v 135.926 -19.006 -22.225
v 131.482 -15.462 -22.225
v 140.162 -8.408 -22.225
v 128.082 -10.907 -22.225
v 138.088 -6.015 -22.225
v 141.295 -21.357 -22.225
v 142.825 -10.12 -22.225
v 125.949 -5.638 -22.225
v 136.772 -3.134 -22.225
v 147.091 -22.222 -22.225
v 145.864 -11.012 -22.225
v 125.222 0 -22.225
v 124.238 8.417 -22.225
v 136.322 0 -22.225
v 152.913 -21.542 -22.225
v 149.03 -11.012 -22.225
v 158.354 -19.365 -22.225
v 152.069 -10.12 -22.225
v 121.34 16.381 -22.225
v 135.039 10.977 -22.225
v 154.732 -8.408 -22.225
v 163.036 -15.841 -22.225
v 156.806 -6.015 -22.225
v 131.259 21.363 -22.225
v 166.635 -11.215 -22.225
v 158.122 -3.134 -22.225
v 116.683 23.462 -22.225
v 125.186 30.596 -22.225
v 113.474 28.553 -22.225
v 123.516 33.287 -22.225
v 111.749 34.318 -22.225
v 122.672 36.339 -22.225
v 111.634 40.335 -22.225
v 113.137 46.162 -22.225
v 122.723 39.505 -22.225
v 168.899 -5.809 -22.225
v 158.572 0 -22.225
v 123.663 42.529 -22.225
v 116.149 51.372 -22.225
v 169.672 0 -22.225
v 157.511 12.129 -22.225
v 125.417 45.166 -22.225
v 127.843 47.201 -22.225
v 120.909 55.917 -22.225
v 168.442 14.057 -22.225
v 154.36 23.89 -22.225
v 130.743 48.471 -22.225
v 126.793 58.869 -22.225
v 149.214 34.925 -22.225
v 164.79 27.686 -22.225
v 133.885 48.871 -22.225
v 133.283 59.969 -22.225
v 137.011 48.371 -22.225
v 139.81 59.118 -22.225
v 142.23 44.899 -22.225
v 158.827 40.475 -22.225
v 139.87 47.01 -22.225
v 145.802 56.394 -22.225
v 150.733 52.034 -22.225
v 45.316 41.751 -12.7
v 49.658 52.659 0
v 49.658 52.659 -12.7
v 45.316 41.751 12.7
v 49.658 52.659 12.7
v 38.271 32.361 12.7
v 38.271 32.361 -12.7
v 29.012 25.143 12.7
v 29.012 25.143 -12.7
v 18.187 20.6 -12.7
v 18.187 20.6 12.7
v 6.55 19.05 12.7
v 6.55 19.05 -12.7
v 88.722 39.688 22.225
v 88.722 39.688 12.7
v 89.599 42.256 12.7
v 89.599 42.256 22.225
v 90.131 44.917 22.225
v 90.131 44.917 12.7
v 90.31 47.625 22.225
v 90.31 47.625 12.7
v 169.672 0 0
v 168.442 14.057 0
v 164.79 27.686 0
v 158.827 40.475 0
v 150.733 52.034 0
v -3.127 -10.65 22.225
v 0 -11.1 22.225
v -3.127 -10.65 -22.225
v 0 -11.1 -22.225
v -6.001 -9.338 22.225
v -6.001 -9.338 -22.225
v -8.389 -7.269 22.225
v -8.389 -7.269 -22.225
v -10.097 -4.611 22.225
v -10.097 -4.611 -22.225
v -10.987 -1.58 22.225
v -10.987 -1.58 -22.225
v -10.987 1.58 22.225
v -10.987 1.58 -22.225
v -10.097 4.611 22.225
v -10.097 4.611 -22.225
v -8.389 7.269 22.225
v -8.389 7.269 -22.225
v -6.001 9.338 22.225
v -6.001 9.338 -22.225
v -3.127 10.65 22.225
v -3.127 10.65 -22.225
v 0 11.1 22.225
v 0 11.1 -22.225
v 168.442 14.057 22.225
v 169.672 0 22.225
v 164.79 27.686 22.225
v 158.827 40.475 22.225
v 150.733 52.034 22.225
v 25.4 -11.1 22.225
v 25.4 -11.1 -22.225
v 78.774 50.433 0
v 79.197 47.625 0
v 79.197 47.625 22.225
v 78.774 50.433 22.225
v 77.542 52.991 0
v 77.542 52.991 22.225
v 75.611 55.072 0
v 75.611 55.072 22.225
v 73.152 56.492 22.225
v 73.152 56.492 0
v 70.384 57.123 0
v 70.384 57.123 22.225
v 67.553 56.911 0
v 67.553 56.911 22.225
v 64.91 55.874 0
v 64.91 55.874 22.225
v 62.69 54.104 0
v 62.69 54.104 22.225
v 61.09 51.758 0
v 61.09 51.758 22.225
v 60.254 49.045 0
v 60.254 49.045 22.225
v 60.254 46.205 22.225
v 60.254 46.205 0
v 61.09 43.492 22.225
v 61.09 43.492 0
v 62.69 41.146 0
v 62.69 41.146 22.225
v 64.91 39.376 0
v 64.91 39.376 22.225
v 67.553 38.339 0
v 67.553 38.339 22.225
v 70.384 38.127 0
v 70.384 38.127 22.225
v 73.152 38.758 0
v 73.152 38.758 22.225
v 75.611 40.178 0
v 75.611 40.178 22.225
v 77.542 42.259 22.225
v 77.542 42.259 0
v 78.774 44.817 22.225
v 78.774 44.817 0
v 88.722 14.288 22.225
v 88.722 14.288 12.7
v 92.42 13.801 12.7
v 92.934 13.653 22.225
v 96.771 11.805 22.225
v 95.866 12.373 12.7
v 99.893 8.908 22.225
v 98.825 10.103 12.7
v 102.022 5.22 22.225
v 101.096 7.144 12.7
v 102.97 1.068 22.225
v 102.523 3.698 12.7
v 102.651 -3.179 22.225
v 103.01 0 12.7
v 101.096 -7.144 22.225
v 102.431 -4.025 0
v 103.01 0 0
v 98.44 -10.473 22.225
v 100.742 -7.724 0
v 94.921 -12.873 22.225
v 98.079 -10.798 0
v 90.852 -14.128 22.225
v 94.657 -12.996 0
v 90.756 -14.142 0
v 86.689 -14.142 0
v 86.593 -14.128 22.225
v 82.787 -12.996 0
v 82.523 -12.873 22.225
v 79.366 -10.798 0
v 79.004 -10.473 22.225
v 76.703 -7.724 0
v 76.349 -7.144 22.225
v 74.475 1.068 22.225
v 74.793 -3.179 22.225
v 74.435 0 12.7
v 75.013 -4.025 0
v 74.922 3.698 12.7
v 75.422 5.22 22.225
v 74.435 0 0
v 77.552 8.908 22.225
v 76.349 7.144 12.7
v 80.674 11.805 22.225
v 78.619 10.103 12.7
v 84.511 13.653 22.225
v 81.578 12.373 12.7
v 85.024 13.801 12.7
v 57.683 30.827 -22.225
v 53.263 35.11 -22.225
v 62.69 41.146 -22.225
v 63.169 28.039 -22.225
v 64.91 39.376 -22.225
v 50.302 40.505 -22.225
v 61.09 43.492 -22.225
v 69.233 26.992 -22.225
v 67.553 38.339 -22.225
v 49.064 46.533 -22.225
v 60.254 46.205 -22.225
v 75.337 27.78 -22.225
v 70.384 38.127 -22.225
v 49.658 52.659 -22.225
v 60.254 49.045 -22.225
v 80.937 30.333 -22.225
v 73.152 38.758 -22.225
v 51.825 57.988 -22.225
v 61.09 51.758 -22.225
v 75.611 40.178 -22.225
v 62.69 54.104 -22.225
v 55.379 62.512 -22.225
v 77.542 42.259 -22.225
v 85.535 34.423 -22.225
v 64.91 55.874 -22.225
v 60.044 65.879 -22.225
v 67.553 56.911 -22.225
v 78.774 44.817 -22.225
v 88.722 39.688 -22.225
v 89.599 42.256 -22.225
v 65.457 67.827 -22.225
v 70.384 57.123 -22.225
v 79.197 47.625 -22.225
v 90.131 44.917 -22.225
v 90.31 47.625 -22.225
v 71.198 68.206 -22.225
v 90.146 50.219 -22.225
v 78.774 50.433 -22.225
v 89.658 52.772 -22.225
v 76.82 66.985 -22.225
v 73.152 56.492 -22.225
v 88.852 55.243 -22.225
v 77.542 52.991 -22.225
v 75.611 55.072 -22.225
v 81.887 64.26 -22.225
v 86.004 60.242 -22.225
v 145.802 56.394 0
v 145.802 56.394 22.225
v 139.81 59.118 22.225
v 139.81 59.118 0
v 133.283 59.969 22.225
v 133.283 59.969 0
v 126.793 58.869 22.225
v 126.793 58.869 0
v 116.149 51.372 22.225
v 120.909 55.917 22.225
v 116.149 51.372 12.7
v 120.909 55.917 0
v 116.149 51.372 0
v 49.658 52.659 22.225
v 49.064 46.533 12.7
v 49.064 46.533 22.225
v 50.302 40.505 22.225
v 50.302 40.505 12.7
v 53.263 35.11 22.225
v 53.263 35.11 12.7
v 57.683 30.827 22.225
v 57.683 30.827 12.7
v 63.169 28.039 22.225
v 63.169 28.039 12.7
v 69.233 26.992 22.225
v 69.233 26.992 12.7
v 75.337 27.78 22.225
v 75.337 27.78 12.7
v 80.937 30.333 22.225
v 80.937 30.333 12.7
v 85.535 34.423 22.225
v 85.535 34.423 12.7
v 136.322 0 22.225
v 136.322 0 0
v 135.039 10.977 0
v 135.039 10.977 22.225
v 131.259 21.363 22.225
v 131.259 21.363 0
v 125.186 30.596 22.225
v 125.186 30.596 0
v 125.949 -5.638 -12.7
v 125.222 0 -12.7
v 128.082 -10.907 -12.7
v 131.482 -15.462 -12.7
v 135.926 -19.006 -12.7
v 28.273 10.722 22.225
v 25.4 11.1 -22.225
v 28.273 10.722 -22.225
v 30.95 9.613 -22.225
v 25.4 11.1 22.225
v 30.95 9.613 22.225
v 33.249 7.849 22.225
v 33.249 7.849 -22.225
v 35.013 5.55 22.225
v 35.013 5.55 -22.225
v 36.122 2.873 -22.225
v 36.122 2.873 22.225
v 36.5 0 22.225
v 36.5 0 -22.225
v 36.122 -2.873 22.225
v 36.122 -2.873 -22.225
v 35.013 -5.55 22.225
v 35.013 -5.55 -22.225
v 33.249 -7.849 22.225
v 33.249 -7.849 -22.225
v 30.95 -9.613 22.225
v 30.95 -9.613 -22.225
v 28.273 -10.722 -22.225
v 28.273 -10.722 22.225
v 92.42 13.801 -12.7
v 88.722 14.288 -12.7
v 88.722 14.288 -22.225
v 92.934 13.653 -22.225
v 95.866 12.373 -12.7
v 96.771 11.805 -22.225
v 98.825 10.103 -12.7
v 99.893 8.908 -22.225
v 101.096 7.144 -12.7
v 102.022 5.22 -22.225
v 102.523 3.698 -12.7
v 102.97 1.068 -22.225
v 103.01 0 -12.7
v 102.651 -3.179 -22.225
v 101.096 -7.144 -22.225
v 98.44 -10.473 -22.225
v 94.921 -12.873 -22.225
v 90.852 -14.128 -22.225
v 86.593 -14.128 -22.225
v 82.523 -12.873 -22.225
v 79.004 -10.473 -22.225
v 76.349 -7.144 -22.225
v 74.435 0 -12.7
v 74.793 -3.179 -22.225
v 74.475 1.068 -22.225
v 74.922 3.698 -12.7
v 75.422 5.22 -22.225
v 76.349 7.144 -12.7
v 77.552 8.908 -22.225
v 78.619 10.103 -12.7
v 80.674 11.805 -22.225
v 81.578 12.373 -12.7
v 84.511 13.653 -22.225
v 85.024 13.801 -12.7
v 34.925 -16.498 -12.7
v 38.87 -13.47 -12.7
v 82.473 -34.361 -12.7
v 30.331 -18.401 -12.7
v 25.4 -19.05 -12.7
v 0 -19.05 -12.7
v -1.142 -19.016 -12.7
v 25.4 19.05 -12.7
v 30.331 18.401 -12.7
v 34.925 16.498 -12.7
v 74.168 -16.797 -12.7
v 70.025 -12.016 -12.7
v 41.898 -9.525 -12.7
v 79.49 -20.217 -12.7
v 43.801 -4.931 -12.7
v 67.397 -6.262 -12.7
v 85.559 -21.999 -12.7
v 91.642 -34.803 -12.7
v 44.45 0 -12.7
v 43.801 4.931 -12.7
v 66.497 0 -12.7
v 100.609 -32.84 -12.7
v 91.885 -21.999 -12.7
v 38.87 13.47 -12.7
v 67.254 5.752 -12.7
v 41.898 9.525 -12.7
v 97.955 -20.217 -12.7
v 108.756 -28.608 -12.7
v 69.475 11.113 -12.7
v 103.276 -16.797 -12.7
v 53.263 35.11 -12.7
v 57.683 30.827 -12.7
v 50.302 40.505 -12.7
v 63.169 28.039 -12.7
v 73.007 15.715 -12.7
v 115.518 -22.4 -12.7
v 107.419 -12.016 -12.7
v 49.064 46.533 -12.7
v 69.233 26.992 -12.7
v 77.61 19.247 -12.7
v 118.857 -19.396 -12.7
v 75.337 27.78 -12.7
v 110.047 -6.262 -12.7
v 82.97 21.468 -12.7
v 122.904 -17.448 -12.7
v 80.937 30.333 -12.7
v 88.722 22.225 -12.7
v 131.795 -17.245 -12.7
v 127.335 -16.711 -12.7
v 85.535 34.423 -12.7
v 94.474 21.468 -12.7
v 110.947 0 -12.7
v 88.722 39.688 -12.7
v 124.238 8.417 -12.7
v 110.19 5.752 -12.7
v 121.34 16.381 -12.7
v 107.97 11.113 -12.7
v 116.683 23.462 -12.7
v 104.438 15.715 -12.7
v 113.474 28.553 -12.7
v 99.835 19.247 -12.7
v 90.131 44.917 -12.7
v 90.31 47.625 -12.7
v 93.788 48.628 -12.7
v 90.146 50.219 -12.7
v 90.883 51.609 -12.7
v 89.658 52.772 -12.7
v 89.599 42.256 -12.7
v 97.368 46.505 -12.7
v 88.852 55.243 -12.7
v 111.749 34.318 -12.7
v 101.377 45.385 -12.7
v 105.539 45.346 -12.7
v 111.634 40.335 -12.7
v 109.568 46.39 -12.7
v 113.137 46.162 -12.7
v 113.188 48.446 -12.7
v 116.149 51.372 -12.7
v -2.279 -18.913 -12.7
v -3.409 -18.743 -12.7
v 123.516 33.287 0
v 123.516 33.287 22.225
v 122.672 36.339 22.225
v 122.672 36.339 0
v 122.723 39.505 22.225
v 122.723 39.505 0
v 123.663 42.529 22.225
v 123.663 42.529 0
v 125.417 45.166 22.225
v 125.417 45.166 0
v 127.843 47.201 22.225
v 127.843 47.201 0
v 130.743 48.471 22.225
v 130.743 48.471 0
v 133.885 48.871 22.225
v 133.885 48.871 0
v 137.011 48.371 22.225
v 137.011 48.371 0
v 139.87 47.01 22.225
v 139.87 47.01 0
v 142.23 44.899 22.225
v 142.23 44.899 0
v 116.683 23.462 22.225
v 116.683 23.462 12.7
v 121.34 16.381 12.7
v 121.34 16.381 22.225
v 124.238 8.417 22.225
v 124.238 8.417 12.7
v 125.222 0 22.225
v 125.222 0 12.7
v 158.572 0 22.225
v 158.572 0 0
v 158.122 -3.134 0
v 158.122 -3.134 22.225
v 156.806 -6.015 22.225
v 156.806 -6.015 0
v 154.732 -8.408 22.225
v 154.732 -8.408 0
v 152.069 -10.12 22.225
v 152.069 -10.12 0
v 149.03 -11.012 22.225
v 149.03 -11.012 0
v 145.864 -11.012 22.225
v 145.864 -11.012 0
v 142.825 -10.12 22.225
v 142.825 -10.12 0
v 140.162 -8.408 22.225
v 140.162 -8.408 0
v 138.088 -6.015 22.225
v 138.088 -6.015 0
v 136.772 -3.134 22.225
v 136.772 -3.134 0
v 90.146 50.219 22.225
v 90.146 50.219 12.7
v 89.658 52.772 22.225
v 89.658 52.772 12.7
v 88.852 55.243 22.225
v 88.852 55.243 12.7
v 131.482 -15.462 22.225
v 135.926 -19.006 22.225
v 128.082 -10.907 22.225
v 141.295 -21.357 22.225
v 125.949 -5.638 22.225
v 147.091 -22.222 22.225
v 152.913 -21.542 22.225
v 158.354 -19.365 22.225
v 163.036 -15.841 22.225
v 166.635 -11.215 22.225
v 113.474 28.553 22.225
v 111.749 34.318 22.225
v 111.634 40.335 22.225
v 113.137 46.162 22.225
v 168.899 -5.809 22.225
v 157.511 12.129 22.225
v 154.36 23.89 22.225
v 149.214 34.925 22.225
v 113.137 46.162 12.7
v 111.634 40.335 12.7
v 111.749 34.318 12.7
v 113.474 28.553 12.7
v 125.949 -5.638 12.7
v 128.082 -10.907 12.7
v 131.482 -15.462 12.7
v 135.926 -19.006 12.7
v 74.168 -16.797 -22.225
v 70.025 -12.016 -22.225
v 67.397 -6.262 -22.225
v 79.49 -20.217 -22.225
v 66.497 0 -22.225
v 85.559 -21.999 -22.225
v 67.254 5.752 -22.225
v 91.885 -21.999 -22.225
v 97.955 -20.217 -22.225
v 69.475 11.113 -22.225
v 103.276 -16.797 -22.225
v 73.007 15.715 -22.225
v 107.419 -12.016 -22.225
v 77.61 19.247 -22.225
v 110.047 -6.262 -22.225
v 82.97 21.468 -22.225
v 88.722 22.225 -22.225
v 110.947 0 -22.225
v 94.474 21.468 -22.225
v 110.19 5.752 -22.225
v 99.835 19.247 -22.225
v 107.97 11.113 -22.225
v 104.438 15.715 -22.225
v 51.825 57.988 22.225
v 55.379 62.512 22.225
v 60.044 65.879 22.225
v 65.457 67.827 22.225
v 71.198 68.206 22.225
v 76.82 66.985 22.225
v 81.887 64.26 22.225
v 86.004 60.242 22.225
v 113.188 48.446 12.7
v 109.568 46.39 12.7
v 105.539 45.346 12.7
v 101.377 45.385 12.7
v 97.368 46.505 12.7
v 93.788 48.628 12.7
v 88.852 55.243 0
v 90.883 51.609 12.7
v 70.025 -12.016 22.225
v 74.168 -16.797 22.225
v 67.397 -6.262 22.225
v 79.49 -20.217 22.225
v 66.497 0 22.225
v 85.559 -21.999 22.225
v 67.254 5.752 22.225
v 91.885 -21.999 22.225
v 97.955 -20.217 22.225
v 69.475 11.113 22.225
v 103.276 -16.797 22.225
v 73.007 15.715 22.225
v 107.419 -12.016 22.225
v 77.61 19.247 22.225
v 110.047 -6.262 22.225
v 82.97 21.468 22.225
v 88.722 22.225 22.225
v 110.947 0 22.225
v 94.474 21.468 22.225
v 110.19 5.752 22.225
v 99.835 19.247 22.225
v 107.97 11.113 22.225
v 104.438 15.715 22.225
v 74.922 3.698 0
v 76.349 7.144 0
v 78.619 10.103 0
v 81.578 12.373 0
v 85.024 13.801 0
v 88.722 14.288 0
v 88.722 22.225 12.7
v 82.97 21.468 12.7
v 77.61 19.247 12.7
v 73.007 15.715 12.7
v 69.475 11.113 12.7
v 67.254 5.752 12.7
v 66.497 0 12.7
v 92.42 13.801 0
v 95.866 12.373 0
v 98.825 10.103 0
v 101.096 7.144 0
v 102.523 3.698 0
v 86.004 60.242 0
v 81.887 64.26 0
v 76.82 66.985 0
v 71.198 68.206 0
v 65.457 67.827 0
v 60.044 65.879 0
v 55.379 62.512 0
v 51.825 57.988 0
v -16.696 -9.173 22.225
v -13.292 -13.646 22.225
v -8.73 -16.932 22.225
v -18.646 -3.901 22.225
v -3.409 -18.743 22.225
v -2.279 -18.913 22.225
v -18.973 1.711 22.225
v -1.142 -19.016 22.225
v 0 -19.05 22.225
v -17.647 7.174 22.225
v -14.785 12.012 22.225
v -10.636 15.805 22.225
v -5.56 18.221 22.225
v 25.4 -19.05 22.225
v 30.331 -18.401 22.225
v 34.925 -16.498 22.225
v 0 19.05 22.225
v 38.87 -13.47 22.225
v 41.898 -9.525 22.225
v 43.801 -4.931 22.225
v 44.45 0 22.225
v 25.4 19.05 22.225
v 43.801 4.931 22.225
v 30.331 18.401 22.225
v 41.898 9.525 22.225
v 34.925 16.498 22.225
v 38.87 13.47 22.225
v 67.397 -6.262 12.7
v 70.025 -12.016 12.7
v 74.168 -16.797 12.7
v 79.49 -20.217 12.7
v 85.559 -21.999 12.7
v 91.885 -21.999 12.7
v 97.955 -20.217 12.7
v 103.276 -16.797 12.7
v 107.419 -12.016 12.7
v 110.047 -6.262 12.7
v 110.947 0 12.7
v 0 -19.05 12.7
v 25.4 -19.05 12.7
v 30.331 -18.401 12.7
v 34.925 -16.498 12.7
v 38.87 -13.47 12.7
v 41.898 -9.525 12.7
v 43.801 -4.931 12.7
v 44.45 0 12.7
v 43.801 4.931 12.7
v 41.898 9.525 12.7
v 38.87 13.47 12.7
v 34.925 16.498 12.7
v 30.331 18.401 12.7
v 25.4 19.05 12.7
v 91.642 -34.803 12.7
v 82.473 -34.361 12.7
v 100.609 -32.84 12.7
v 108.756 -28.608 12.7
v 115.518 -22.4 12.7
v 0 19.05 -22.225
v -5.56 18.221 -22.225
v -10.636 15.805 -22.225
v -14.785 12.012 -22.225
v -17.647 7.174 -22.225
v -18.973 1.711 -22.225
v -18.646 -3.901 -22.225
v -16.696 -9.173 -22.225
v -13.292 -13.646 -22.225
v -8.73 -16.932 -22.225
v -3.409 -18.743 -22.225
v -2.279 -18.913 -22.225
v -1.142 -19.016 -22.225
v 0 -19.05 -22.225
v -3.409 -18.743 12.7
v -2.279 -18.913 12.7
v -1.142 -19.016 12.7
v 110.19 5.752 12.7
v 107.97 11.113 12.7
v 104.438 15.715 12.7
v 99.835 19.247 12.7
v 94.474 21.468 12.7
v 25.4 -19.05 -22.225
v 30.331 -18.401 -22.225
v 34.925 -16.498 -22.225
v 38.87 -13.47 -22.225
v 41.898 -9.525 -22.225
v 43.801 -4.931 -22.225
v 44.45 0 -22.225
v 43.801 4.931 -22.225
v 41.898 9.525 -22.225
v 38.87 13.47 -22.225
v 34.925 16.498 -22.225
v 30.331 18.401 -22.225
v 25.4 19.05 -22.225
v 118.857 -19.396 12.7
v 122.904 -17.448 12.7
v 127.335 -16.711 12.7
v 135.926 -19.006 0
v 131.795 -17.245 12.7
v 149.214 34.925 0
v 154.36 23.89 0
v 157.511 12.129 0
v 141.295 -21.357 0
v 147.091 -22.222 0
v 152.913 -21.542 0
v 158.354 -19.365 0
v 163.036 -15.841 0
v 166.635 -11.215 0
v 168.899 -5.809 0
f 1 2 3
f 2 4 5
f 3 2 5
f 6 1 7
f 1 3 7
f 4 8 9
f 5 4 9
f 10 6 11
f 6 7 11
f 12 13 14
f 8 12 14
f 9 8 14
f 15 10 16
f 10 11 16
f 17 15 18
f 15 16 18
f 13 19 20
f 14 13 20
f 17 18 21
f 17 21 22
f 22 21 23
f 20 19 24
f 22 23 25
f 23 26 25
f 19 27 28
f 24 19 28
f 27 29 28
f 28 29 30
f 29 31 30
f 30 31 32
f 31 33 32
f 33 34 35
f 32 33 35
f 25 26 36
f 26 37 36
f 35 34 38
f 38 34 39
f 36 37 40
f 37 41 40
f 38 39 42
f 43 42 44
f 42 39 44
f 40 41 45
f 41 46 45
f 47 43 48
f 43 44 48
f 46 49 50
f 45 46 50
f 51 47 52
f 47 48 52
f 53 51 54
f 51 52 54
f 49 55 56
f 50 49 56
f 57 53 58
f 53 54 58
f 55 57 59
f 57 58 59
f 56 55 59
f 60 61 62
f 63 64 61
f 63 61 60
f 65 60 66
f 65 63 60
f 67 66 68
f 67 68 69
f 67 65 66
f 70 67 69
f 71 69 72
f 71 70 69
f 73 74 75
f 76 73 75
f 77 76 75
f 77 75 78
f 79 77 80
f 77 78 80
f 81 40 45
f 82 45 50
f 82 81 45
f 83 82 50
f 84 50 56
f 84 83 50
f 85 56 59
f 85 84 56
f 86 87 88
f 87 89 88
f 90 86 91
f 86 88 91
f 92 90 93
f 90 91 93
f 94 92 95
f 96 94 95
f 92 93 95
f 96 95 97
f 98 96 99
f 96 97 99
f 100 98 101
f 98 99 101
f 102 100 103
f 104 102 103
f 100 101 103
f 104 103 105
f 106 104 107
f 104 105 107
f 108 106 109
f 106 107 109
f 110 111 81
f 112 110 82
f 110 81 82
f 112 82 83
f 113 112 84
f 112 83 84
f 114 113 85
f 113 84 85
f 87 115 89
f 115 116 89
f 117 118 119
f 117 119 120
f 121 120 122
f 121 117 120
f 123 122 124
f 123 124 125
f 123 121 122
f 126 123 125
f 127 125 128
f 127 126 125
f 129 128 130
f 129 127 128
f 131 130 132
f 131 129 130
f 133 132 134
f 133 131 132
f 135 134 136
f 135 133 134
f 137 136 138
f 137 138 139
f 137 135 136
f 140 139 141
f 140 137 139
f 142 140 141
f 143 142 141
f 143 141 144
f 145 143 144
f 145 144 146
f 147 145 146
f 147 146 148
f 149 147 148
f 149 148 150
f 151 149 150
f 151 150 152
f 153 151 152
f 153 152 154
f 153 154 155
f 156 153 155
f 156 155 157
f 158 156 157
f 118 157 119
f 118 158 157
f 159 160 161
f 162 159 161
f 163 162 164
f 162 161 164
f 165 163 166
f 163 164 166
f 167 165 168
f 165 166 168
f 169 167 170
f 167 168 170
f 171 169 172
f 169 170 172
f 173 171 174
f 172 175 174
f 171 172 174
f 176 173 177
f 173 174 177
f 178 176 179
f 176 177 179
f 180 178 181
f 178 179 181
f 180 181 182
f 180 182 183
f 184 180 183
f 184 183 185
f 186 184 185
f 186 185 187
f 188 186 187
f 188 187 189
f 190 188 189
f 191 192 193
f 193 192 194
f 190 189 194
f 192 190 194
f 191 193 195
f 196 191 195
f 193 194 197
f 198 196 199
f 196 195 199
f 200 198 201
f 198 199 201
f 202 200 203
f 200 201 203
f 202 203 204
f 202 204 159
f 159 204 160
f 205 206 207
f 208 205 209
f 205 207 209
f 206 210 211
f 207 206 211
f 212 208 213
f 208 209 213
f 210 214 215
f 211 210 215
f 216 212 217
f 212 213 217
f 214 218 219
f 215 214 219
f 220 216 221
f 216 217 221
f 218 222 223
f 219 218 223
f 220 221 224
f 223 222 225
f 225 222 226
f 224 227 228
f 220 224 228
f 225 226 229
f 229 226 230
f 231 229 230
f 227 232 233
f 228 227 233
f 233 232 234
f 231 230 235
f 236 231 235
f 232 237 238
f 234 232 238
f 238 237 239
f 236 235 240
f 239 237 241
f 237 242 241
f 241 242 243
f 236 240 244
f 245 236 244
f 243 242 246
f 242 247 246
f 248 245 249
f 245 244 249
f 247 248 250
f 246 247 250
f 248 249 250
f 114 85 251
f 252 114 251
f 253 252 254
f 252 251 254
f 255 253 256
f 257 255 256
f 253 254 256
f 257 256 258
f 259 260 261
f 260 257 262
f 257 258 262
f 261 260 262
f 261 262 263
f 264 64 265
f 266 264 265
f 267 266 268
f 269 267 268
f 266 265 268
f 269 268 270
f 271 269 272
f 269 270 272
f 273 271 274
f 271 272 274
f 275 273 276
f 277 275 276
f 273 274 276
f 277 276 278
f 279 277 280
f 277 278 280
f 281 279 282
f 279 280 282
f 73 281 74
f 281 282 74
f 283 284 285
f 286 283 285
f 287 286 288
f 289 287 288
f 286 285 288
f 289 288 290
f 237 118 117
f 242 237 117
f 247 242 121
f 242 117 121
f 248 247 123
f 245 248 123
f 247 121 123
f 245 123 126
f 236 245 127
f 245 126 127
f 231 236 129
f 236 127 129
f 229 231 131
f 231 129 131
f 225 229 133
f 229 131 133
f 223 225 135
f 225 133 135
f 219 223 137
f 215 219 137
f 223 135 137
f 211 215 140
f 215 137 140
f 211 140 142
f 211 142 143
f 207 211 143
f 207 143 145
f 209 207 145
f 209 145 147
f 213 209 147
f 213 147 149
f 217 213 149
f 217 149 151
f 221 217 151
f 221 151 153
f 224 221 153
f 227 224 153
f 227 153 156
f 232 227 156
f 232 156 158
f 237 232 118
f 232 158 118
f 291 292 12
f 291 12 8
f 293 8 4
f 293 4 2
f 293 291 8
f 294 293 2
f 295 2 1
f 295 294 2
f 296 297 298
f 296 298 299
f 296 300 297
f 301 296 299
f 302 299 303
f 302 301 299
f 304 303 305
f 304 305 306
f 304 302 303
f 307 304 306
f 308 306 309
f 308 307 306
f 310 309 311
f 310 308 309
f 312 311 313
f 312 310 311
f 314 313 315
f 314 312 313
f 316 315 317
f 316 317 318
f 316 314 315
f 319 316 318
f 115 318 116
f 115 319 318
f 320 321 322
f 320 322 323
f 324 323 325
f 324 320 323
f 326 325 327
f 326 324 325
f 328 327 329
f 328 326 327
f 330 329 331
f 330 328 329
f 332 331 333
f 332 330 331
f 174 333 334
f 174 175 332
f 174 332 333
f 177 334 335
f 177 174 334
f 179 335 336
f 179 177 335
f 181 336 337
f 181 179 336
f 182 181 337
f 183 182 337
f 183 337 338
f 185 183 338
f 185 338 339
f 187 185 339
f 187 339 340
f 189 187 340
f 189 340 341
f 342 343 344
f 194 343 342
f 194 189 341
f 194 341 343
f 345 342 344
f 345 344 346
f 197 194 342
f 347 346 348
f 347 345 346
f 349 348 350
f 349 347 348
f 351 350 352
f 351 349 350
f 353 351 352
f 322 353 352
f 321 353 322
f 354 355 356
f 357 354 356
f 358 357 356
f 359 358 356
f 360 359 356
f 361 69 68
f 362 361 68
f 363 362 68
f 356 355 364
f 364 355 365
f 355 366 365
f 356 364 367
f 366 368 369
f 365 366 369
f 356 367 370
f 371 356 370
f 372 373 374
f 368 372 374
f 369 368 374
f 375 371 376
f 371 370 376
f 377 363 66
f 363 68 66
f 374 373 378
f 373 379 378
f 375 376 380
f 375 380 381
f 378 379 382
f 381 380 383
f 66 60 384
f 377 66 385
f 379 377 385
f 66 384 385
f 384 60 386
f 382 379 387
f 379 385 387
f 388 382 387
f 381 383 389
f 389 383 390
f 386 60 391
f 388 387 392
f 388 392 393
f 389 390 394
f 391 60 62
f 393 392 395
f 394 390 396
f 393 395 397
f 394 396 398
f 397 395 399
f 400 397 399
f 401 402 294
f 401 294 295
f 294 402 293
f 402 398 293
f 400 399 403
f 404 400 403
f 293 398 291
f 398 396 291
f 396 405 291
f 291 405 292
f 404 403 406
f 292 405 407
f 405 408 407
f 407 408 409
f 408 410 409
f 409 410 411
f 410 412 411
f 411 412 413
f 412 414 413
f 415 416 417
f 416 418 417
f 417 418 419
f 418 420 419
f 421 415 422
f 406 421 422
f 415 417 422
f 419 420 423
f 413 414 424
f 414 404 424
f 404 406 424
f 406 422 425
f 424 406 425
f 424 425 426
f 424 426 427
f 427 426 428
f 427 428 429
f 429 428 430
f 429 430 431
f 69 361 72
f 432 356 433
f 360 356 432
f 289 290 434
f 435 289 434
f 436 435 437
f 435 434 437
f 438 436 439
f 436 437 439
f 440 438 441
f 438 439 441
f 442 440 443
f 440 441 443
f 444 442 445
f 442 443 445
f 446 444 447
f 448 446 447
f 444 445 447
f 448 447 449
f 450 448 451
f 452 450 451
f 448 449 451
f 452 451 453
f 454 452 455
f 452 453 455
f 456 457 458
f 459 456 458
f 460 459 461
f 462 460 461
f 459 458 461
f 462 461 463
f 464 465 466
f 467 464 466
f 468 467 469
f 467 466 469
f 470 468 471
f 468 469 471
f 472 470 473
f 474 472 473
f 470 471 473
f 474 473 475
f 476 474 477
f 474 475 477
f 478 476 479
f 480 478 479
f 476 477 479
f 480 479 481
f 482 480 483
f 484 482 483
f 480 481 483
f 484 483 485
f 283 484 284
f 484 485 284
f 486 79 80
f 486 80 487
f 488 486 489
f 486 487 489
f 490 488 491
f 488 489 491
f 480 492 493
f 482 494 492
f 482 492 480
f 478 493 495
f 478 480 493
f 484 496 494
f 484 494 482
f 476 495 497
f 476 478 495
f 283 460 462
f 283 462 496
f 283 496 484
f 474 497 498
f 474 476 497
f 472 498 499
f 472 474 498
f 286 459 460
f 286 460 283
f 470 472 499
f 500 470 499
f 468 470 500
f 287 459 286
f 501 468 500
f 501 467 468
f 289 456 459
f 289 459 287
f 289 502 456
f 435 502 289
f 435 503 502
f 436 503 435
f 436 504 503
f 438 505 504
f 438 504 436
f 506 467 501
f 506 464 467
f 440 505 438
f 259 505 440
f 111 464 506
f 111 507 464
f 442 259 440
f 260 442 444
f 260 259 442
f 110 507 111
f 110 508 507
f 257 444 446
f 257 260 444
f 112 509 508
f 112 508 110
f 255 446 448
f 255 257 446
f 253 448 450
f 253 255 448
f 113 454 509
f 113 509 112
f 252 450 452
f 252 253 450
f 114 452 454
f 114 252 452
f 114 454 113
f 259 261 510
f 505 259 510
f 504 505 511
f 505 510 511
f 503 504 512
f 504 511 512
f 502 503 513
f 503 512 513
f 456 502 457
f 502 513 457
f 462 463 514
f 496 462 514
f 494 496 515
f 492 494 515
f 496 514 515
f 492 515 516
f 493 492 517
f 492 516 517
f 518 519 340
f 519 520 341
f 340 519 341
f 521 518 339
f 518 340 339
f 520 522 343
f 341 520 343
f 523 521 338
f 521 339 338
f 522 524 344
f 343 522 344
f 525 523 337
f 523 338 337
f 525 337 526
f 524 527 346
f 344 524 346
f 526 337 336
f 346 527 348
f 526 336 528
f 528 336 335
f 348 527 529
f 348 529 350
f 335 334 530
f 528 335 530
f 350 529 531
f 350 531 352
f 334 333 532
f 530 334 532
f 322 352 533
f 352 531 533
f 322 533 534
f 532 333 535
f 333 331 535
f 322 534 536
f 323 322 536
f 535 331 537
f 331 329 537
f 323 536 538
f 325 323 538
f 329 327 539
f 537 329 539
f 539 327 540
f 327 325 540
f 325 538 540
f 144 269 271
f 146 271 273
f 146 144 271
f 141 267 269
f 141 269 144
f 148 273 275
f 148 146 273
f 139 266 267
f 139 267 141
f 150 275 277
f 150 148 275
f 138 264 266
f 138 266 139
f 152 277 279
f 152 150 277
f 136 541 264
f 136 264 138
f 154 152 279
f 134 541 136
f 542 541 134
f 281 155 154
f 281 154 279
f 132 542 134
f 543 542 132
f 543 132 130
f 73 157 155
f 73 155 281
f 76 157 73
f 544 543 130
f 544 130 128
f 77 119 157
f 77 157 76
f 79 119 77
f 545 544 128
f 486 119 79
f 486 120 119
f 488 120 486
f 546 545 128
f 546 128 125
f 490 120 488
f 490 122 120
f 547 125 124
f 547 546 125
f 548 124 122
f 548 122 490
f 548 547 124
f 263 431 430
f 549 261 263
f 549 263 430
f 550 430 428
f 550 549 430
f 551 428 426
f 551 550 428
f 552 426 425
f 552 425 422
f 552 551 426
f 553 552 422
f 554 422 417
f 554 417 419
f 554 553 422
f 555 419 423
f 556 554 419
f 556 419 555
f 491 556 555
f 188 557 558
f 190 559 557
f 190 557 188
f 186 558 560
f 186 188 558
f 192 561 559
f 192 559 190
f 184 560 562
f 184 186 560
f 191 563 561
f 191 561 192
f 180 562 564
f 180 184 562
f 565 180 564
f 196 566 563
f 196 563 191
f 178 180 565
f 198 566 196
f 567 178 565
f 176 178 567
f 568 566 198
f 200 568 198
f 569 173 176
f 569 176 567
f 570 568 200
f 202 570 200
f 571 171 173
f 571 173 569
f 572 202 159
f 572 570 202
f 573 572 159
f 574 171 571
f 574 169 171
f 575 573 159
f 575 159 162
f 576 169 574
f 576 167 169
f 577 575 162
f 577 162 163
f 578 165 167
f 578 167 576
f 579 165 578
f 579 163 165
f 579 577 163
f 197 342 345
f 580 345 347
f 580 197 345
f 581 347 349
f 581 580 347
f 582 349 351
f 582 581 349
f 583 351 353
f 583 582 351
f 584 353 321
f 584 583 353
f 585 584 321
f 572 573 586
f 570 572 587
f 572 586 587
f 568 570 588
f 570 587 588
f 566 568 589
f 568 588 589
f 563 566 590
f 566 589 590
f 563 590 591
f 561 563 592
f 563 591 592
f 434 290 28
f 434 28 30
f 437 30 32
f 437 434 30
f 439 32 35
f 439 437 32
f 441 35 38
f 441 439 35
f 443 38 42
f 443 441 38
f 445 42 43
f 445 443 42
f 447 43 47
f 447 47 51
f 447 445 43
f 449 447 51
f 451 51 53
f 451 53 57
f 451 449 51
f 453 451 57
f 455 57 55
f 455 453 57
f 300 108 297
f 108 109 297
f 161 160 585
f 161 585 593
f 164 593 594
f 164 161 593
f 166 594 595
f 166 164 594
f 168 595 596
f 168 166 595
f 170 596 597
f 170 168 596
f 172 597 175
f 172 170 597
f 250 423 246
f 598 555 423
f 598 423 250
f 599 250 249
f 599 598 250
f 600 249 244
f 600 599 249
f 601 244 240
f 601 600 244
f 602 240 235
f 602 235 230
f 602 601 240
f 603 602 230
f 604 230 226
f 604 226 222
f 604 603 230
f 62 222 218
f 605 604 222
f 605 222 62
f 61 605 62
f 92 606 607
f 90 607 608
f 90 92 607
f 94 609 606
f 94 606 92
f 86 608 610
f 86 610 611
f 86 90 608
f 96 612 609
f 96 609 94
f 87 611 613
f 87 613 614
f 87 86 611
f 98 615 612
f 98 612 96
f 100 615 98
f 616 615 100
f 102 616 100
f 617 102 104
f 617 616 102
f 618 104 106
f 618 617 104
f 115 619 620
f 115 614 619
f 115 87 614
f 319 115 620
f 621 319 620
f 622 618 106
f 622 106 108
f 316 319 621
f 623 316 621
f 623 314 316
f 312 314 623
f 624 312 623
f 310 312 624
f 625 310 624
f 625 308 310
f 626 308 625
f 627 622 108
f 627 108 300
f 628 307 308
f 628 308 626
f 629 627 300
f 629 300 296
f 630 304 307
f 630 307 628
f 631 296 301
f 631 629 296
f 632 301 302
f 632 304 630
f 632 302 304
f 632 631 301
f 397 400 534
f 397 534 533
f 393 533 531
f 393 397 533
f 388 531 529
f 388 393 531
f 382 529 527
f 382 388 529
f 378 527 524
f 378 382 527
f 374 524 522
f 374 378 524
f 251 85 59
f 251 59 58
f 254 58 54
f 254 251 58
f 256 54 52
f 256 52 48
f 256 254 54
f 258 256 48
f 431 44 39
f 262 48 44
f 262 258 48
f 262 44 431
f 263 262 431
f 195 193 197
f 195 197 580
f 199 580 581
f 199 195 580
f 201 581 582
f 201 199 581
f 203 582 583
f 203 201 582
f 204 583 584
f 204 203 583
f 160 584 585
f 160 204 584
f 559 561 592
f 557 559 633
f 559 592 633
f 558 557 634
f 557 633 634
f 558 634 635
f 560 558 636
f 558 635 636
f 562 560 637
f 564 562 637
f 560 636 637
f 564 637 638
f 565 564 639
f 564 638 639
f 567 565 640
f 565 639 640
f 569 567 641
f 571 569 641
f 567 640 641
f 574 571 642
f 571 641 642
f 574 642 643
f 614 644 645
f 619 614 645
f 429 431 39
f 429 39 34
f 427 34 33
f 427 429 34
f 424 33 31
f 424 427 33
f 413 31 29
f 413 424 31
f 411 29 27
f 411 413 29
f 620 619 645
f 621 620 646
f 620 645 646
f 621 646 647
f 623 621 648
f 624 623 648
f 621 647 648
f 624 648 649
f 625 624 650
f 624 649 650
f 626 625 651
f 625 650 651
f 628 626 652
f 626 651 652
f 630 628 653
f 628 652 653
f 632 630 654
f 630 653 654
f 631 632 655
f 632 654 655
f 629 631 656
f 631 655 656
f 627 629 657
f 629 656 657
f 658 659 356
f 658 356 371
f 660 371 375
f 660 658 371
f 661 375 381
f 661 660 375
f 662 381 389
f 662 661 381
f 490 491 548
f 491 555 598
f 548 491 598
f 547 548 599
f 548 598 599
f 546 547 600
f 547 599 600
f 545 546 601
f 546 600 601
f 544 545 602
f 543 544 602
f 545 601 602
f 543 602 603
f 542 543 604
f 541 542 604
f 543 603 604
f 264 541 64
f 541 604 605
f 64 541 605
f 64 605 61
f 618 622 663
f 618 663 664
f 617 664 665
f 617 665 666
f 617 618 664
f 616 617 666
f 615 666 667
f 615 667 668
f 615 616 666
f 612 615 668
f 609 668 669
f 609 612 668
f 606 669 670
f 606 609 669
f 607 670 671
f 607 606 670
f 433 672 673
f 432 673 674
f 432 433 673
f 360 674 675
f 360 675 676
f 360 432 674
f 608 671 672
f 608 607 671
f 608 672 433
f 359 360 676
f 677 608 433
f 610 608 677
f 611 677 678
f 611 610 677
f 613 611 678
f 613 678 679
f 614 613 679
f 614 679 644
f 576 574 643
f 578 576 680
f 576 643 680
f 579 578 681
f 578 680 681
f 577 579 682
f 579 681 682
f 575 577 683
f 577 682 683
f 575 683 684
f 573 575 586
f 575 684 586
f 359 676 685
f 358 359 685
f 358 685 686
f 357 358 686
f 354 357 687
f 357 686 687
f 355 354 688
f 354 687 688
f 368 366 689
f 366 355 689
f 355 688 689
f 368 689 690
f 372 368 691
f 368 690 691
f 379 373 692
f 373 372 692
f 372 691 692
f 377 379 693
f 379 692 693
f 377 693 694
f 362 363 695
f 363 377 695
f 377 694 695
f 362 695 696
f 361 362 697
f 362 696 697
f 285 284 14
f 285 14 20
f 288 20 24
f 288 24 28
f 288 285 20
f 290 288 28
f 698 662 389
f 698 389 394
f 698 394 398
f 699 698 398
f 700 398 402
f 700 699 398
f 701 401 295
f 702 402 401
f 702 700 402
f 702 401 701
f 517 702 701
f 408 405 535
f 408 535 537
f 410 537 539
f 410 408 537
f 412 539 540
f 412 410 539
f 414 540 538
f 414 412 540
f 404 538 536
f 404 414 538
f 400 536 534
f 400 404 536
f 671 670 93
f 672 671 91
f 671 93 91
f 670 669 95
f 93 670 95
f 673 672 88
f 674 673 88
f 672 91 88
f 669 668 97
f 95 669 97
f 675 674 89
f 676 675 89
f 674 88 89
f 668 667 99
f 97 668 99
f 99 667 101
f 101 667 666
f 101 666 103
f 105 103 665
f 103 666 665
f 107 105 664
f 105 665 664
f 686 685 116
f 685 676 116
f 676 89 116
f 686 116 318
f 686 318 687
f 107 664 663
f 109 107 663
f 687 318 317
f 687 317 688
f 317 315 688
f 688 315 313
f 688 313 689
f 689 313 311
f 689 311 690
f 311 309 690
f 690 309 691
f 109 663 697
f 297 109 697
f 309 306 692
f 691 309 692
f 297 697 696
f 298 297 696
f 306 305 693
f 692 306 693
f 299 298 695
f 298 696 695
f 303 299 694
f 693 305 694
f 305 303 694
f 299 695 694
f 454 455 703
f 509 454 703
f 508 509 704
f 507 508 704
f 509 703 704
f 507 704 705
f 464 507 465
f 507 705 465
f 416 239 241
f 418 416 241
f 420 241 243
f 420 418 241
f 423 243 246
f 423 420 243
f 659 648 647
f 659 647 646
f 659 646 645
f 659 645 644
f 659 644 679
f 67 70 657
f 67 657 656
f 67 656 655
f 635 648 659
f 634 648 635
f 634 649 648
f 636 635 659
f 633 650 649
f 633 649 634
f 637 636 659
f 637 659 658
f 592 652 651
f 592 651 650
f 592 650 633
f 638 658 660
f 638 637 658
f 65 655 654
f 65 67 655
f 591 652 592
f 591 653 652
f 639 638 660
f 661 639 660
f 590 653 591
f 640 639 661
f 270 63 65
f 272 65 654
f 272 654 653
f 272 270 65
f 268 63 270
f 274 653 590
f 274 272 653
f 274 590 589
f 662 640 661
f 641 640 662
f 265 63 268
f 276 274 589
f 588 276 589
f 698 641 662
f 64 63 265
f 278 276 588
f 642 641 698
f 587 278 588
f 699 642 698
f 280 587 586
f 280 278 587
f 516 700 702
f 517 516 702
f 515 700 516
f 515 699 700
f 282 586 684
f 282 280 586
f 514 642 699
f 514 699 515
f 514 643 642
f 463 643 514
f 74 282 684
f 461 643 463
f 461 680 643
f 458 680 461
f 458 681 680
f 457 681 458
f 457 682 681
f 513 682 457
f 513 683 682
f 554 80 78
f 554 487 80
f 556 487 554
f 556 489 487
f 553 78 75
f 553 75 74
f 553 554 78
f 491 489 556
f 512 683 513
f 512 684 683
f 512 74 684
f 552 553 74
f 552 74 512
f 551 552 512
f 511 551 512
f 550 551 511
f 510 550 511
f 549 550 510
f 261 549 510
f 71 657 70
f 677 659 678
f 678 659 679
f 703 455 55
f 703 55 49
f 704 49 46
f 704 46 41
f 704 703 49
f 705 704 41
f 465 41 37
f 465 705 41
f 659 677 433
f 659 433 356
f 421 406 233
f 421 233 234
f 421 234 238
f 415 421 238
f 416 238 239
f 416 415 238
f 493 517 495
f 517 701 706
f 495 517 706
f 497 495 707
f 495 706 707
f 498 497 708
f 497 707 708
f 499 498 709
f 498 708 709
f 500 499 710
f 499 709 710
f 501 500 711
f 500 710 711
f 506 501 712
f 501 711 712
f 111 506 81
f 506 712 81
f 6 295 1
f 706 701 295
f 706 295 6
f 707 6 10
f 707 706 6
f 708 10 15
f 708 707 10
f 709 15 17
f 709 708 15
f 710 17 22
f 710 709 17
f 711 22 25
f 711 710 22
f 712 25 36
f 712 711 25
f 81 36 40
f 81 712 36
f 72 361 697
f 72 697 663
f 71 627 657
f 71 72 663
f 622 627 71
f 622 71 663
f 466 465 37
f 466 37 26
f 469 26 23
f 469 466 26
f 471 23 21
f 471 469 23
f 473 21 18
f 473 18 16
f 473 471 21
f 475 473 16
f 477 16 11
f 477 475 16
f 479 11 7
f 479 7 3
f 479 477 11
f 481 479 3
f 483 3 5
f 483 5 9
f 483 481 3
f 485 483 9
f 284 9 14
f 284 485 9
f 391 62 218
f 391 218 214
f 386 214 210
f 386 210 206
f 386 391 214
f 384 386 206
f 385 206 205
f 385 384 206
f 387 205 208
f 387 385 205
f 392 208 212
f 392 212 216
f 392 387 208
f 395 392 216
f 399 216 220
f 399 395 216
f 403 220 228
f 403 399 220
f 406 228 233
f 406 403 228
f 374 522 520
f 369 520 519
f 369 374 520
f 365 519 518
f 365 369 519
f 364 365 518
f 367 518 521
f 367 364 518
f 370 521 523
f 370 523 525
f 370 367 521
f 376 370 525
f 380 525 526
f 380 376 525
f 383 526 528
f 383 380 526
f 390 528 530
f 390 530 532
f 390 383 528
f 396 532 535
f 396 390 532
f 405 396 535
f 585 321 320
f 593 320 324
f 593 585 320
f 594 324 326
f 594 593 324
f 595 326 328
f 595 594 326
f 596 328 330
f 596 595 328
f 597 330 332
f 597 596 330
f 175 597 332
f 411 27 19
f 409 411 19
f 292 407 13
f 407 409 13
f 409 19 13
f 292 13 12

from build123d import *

# Parameters (mm, degrees)
F1_DEPTH = 12.7
F0_R     = 9.525
F2_DEPTH = 22.225


with BuildPart() as f1:
    # F0 (on Top) → F1 (new body, symmetric)
    with BuildSketch(Plane.XY):
        with BuildLine():
            ThreePointArc((88.7222, 14.2875), (98.8249881362, 10.1027881362), (103.0097, 0))
            Line((103.0097, 0), (110.9472, 0))
            ThreePointArc((110.9472, 0), (104.4376482119, 15.7154482119), (88.7222, 22.225))
            Line((88.7222, 22.225), (88.7222, 14.2875))
        make_face()
        with BuildLine():
            Line((66.4972, 0), (74.4347, 0))
            ThreePointArc((74.4347, 0), (78.6194118638, 10.1027881362), (88.7222, 14.2875))
            Line((88.7222, 14.2875), (88.7222, 22.225))
            ThreePointArc((88.7222, 22.225), (73.0067517881, 15.7154482119), (66.4972, 0))
        make_face()
        with BuildLine():
            ThreePointArc((88.7222, 22.225), (104.4376482119, 15.7154482119), (110.9472, 0))
            Line((110.9472, 0), (125.222, 0))
            ThreePointArc((125.222, 0), (123.0207927202, 12.4836668274), (116.682668965, 23.461619196))
            ThreePointArc((116.682668965, 23.461619196), (111.4870759361, 37.3222969765), (116.1485113735, 51.3716241887))
            ThreePointArc((116.1485113735, 51.3716241887), (101.3767802444, 45.3853872913), (88.852182223, 55.2430501556))
            ThreePointArc((88.852182223, 55.2430501556), (89.9420456997, 51.5031131444), (90.3097, 47.625))
            ThreePointArc((90.3097, 47.625), (89.9089336946, 43.5776532611), (88.7222, 39.6875))
            Line((88.7222, 39.6875), (88.7222, 22.225))
        make_face()
        with BuildLine():
            Line((125.222, 0), (110.9472, 0))
            ThreePointArc((110.9472, 0), (88.7222, -22.225), (66.4972, 0))
            Line((66.4972, 0), (44.45, 0))
            ThreePointArc((44.45, 0), (38.8703841816, -13.4703841816), (25.4, -19.05))
            Line((25.4, -19.05), (0, -19.05))
            ThreePointArc((0, -19.05), (-1.7112193853, -18.9729868027), (-3.4086029201, -18.7425698914))
            Line((-3.4086029201, -18.7425698914), (82.4730946464, -34.3613781342))
            ThreePointArc((82.4730946464, -34.3613781342), (100.6094978328, -32.8397286109), (115.5177113754, -22.3999150697))
            ThreePointArc((115.5177113754, -22.3999150697), (125.0932774359, -16.9217551289), (135.9264520761, -19.005988544))
            ThreePointArc((135.9264520761, -19.005988544), (128.0821503671, -10.9065679155), (125.222, 0))
        make_face()
        with BuildLine():
            Line((44.45, 0), (66.4972, 0))
            ThreePointArc((66.4972, 0), (73.0067517881, 15.7154482119), (88.7222, 22.225))
            Line((88.7222, 22.225), (88.7222, 39.6875))
            ThreePointArc((88.7222, 39.6875), (63.1687863903, 28.0389841297), (49.6579571791, 52.6585365854))
            ThreePointArc((49.6579571791, 52.6585365854), (33.8807382573, 28.4450035745), (6.5503572572, 19.05))
            Line((6.5503572572, 19.05), (25.4, 19.05))
            ThreePointArc((25.4, 19.05), (38.8703841816, 13.4703841816), (44.45, 0))
        make_face()
    extrude(amount=F1_DEPTH, both=True)

    # F0 (on Top) → F2 (join, symmetric)
    with BuildSketch(Plane.XY):
        with BuildLine():
            ThreePointArc((88.7222, 14.2875), (98.8249881362, 10.1027881362), (103.0097, 0))
            Line((103.0097, 0), (110.9472, 0))
            ThreePointArc((110.9472, 0), (104.4376482119, 15.7154482119), (88.7222, 22.225))
            Line((88.7222, 22.225), (88.7222, 14.2875))
        make_face()
        with BuildLine():
            Line((110.9472, 0), (103.0097, 0))
            ThreePointArc((103.0097, 0), (88.7222, -14.2875), (74.4347, 0))
            Line((74.4347, 0), (66.4972, 0))
            ThreePointArc((66.4972, 0), (88.7222, -22.225), (110.9472, 0))
        make_face()
        with BuildLine():
            Line((66.4972, 0), (74.4347, 0))
            ThreePointArc((74.4347, 0), (78.6194118638, 10.1027881362), (88.7222, 14.2875))
            Line((88.7222, 14.2875), (88.7222, 22.225))
            ThreePointArc((88.7222, 22.225), (73.0067517881, 15.7154482119), (66.4972, 0))
        make_face()
        with BuildLine():
            ThreePointArc((116.682668965, 23.461619196), (123.0207927202, 12.4836668274), (125.222, 0))
            Line((125.222, 0), (136.3218, 0))
            ThreePointArc((136.3218, 0), (133.4511928724, 16.2800220142), (125.1856090747, 30.596433106))
            ThreePointArc((125.1856090747, 30.596433106), (126.556865998, 46.2699714599), (142.2304043519, 44.8987145366))
            ThreePointArc((142.2304043519, 44.8987145366), (154.3597295619, 23.8901070113), (158.5722, 0))
            Line((158.5722, 0), (169.672, 0))
            ThreePointArc((169.672, 0), (164.7901297141, 27.6864621982), (150.7333444616, 52.0335284466))
            ThreePointArc((150.7333444616, 52.0335284466), (133.2827298684, 59.9685045985), (116.1485113735, 51.3716241887))
            ThreePointArc((116.1485113735, 51.3716241887), (111.4870759361, 37.3222969765), (116.682668965, 23.461619196))
        make_face()
        with BuildLine():
            Line((136.3218, 0), (125.222, 0))
            ThreePointArc((125.222, 0), (128.0821503671, -10.9065679155), (135.9264520761, -19.005988544))
            ThreePointArc((135.9264520761, -19.005988544), (158.3535679155, -19.3648496329), (169.672, 0))
            Line((169.672, 0), (158.5722, 0))
            ThreePointArc((158.5722, 0), (147.447, -11.1252), (136.3218, 0))
        make_face()
        with BuildLine():
            ThreePointArc((25.4, -19.05), (38.8703841816, -13.4703841816), (44.45, 0))
            ThreePointArc((44.45, 0), (38.8703841816, 13.4703841816), (25.4, 19.05))
            Line((25.4, 19.05), (6.5503572572, 19.05))
            Line((6.5503572572, 19.05), (0, 19.05))
            ThreePointArc((0, 19.05), (-18.9729868027, 1.7112193853), (-3.4086029201, -18.7425698914))
            ThreePointArc((-3.4086029201, -18.7425698914), (-1.7112193853, -18.9729868027), (0, -19.05))
            Line((0, -19.05), (25.4, -19.05))
        make_face()
        with BuildLine():
            ThreePointArc((25.4, 11.0998), (33.2487438498, 7.8487438498), (36.4998, 0))
            ThreePointArc((36.4998, 0), (33.2487438498, -7.8487438498), (25.4, -11.0998))
            Line((25.4, -11.0998), (0, -11.0998))
            ThreePointArc((0, -11.0998), (-11.0998, 0), (0, 11.0998))
            Line((0, 11.0998), (25.4, 11.0998))
        make_face(mode=Mode.SUBTRACT)
        with BuildLine():
            ThreePointArc((49.6579571791, 52.6585365854), (63.1687863903, 28.0389841297), (88.7222, 39.6875))
            ThreePointArc((88.7222, 39.6875), (89.9089336946, 43.5776532611), (90.3097, 47.625))
            ThreePointArc((90.3097, 47.625), (89.9420456997, 51.5031131444), (88.852182223, 55.2430501556))
            ThreePointArc((88.852182223, 55.2430501556), (68.314287895, 68.217777398), (49.6579571791, 52.6585365854))
        make_face()
        with Locations((69.6722, 47.625)):
            Circle(F0_R, mode=Mode.SUBTRACT)
    extrude(amount=F2_DEPTH, both=True)


solid = f1.part
